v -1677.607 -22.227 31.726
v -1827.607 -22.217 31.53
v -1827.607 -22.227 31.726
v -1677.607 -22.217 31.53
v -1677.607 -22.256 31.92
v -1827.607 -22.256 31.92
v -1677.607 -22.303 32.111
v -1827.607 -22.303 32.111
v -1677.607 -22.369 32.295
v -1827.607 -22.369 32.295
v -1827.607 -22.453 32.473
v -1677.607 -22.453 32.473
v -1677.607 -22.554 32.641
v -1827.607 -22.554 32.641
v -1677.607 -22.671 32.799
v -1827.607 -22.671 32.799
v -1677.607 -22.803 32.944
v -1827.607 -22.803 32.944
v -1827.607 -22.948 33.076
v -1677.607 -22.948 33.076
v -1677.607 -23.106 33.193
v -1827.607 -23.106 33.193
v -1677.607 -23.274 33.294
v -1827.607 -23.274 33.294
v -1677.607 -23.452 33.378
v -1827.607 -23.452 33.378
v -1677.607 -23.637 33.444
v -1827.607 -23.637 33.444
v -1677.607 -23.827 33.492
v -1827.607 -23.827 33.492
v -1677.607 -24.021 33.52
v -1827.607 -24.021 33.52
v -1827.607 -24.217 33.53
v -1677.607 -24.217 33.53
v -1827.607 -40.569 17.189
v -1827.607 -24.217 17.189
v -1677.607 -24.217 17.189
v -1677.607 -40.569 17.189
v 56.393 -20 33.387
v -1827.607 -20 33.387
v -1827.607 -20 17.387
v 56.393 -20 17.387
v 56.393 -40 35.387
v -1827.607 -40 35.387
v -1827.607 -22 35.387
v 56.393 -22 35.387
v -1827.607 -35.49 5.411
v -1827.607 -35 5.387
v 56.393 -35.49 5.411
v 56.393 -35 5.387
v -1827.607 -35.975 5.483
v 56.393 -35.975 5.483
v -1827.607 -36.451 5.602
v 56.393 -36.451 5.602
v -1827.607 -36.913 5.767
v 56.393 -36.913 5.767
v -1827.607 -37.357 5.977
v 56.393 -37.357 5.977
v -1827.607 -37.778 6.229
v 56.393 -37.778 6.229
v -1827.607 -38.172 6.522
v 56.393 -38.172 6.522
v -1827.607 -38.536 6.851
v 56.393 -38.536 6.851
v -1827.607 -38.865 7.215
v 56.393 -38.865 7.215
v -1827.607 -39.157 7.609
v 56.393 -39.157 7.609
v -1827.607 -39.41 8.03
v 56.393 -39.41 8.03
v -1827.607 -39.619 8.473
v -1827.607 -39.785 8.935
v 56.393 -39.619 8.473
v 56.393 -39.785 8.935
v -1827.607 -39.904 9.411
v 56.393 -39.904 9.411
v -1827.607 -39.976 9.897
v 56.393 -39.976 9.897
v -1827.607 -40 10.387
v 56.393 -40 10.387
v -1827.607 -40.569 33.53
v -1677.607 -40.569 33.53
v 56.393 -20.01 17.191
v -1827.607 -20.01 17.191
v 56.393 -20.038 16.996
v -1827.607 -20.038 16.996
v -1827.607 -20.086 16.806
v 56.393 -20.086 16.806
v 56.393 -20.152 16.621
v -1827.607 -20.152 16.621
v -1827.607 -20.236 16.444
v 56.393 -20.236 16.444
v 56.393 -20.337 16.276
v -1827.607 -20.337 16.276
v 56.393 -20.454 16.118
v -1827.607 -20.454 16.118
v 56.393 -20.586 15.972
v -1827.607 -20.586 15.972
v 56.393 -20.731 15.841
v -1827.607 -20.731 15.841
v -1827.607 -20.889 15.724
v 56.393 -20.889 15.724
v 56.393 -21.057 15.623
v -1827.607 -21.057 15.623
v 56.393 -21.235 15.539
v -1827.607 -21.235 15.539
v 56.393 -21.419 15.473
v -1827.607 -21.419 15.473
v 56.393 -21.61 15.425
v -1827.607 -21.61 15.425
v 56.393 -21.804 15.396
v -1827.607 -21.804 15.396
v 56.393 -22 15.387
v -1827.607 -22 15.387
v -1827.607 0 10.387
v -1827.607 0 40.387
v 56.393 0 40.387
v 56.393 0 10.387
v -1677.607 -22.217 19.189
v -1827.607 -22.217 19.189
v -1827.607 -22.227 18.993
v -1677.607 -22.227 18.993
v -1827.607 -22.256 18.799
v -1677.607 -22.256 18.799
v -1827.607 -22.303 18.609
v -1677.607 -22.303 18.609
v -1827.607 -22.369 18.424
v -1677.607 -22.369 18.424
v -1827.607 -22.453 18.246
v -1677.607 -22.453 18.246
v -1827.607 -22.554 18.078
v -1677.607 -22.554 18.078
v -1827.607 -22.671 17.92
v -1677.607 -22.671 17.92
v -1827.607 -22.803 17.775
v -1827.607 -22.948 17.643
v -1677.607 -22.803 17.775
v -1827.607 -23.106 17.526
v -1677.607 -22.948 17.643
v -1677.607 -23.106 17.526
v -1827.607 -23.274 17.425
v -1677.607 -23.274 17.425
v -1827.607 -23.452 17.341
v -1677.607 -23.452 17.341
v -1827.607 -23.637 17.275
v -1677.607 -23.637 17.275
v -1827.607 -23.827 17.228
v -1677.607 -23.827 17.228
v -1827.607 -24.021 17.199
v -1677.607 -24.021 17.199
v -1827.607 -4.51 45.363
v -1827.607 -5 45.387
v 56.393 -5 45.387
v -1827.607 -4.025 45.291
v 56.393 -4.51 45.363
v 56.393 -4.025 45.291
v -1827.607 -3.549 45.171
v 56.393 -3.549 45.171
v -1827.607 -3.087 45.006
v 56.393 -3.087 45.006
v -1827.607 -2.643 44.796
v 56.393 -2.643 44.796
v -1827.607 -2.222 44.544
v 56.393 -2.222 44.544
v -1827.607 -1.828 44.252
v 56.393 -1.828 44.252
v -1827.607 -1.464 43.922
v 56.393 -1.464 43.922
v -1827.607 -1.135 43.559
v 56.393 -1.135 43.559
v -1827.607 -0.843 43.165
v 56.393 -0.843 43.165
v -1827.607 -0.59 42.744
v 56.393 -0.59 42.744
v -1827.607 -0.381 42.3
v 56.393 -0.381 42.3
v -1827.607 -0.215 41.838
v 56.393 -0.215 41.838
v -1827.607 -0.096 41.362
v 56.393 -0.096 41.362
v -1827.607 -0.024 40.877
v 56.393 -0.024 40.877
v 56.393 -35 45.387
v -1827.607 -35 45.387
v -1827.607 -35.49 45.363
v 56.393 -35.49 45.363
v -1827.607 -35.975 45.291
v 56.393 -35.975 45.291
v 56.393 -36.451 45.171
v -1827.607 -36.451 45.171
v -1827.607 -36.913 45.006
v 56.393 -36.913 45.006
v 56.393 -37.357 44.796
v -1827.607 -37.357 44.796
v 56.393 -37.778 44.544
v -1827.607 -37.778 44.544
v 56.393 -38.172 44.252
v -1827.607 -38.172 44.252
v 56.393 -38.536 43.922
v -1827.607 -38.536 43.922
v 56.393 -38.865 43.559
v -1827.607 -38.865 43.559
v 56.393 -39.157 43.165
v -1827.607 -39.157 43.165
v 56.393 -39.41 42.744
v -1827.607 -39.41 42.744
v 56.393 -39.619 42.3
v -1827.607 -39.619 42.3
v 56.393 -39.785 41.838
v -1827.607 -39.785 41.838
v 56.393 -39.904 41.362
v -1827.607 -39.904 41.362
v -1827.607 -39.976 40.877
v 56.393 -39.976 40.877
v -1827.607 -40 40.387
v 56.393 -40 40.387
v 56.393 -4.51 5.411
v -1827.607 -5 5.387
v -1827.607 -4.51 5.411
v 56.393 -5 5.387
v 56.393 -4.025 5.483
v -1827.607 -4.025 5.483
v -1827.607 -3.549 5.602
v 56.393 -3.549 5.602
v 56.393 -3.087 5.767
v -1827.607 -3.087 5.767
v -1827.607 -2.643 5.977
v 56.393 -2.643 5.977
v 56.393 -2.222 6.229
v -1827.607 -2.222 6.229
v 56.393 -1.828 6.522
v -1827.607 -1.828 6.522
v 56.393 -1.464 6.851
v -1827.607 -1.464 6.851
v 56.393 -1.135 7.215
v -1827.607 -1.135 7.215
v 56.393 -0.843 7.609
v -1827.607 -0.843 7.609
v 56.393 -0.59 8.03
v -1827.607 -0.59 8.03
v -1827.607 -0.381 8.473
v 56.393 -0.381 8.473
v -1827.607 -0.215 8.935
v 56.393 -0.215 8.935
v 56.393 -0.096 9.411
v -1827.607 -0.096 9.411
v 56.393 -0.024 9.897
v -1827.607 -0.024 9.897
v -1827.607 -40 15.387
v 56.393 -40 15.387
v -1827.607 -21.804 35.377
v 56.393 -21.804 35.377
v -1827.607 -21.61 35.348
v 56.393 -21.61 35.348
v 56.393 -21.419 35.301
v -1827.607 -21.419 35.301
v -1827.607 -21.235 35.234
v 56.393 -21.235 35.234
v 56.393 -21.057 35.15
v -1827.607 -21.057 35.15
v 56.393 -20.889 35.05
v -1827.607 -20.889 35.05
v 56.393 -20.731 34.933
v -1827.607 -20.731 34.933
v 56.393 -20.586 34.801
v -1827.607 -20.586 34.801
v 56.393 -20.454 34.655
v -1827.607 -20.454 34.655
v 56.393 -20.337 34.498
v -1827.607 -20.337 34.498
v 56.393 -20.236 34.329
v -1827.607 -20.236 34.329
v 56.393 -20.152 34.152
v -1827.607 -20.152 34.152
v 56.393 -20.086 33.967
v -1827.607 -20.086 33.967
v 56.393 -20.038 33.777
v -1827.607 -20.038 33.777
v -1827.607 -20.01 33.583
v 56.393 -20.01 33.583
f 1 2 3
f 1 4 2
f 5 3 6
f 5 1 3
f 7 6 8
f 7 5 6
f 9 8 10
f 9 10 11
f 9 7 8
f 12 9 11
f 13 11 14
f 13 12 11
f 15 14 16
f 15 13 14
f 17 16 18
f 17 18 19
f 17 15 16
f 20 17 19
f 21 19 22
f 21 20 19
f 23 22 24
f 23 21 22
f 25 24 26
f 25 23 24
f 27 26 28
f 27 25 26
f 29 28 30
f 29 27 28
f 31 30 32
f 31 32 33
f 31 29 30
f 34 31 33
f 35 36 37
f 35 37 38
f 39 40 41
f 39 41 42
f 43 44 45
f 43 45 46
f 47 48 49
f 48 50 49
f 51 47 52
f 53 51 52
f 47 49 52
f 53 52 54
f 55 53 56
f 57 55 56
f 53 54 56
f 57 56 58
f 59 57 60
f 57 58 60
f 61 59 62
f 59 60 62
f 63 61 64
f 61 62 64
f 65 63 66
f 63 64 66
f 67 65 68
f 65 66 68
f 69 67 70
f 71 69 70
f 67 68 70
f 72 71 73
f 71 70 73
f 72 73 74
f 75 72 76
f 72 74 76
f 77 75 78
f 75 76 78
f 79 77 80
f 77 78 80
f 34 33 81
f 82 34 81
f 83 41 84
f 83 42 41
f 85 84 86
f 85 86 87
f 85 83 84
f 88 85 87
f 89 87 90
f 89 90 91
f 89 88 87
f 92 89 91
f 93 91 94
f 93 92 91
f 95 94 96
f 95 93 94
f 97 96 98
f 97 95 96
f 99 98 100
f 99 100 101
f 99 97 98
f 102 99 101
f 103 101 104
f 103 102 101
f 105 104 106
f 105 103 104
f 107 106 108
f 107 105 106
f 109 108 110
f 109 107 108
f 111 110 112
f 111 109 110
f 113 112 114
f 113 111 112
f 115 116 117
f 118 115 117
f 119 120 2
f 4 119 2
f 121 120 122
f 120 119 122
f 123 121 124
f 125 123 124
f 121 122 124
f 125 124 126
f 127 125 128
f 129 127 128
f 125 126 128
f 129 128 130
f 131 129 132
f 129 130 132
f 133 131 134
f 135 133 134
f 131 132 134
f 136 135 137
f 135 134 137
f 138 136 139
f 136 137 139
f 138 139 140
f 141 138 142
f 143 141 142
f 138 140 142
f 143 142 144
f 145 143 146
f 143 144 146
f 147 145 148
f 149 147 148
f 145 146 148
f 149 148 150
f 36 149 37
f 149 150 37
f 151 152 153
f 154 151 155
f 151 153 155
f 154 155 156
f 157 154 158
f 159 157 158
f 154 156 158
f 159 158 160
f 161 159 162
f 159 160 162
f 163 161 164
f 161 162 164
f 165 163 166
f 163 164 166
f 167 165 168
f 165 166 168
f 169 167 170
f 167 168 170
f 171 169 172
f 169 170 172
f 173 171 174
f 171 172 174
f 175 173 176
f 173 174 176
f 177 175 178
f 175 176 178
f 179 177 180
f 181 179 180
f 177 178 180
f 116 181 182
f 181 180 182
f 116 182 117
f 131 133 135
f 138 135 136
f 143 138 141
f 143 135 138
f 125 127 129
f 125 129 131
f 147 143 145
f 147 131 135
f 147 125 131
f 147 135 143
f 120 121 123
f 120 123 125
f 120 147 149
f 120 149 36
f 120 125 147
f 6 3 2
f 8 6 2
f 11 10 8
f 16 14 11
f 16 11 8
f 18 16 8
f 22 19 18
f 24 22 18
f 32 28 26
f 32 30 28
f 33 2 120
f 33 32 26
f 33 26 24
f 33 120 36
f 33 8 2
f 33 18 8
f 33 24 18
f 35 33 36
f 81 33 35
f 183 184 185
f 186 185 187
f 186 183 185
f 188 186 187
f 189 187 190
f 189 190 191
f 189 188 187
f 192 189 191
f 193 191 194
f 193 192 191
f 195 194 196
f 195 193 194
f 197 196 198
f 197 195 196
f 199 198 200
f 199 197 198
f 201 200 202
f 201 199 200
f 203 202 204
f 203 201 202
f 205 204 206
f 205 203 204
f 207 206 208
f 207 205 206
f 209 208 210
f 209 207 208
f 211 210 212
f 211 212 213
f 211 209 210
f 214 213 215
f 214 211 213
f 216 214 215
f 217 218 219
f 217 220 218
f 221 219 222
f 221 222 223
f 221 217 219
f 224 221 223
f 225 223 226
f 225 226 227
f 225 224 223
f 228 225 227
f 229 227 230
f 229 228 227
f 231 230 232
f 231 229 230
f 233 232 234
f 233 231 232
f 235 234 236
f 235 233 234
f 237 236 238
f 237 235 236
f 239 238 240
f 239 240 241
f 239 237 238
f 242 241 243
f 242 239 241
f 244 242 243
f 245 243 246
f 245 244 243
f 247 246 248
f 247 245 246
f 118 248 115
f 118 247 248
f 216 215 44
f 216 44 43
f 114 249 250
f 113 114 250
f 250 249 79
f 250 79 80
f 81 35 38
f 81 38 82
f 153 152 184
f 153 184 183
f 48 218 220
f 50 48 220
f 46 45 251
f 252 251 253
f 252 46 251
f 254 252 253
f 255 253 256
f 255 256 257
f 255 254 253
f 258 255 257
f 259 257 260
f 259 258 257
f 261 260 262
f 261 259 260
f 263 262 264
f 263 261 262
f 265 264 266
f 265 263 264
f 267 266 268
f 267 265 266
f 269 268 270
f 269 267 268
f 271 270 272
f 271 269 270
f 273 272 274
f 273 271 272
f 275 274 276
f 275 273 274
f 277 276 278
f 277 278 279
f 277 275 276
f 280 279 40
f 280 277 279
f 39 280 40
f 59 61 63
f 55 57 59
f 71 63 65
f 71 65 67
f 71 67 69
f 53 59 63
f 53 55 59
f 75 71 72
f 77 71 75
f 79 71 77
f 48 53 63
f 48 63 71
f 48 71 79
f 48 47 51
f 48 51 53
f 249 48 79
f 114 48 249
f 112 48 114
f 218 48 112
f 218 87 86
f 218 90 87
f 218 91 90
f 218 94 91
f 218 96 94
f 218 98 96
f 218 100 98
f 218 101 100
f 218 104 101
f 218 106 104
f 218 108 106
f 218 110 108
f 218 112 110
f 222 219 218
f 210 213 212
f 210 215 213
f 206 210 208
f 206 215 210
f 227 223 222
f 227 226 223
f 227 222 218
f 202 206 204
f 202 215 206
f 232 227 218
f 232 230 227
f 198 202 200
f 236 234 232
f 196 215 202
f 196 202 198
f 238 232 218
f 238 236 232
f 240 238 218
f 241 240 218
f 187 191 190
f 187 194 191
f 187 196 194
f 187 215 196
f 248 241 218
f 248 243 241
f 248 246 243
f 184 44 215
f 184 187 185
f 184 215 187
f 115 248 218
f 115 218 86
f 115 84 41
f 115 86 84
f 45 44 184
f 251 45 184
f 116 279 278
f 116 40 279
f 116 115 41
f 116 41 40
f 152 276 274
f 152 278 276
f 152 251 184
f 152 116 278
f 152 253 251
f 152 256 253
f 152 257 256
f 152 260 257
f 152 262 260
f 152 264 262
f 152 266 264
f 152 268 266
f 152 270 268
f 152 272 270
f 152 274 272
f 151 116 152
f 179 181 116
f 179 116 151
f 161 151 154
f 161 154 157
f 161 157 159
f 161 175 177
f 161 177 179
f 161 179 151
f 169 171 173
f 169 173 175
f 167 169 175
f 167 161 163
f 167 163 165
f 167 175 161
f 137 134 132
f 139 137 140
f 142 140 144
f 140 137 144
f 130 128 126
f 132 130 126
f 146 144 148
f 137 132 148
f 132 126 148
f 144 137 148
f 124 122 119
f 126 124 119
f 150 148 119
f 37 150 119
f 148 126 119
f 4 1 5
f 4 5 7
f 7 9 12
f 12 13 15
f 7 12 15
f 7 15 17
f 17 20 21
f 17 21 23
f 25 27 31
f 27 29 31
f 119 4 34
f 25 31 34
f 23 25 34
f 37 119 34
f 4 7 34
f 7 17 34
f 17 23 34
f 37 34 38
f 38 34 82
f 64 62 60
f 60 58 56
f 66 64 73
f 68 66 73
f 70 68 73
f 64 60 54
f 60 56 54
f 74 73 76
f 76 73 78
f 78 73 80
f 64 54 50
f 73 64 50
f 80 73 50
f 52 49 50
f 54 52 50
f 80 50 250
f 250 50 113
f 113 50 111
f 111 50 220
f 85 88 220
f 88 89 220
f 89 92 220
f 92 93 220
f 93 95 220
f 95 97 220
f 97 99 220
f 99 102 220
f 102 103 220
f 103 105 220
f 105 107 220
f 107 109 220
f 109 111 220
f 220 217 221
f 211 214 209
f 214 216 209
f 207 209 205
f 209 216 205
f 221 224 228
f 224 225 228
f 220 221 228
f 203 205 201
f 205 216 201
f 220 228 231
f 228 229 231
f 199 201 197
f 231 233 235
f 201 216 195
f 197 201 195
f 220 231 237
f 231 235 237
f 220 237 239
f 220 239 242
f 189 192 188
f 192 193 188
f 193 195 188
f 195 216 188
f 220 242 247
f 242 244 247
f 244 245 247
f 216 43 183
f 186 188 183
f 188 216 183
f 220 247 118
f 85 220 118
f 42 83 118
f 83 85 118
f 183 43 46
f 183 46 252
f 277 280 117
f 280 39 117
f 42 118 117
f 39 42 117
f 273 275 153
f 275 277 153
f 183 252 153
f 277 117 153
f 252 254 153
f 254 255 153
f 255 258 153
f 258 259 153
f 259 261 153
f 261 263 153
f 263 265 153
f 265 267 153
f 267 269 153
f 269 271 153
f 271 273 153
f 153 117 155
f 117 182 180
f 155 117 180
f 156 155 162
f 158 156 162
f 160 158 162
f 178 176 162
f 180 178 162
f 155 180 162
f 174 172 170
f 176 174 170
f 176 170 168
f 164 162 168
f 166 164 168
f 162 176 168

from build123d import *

# Parameters (mm, degrees)
F0_W     = 1884
F0_H     = 40
F1_DEPTH = 40
F2_R     = 5
F3_W     = 1884
F3_H     = 20
F4_DEPTH = 20
F5_W     = 18.351957
F5_H     = 16.340779
F6_DEPTH = 150
F7_R     = 2
F8_R     = 2


with BuildPart() as f1:
    # F0 (on Front) → F1 (new body)
    with BuildSketch(Plane.XZ):
        with Locations((-885.606991, 25.386653)):
            Rectangle(F0_W, F0_H)
    extrude(amount=F1_DEPTH)

    # F2
    f2_edges = [f1.edges().sort_by_distance(p)[0] for p in [
        (-885.606991, -40, 45.386653),
        (-885.606991, 0, 45.386653),
        (-885.606991, -40, 5.386653),
        (-885.606991, 0, 5.386653),
    ]]
    fillet(f2_edges, radius=F2_R)

    # F3 (on face) → F4 (cut)
    with BuildSketch(Plane.XZ.offset(40)):
        with Locations((-885.606991, 25.386653)):
            Rectangle(F3_W, F3_H)
    extrude(amount=-F4_DEPTH, mode=Mode.SUBTRACT)

    # F8
    f8_edges = [f1.edges().sort_by_distance(p)[0] for p in [
        (-885.606991, -20, 15.386653),
        (-885.606991, -20, 35.386653),
    ]]
    fillet(f8_edges, radius=F8_R)


with BuildPart() as f6:
    # F5 (on face) → F6 (new body)
    with BuildSketch(Plane(origin=(-1827.606991, 0, 0), x_dir=(0, -1, 0), z_dir=(-1, 0, 0))):
        with Locations((31.393159, 25.359637)):
            Rectangle(F5_W, F5_H)
    extrude(amount=-F6_DEPTH)

    # F7
    f7_edges = [f6.edges().sort_by_distance(p)[0] for p in [
        (-1752.606991, -22.217181, 33.530027),
        (-1752.606991, -22.217181, 17.189248),
    ]]
    fillet(f7_edges, radius=F7_R)


solid = Compound([f1.part, f6.part])
